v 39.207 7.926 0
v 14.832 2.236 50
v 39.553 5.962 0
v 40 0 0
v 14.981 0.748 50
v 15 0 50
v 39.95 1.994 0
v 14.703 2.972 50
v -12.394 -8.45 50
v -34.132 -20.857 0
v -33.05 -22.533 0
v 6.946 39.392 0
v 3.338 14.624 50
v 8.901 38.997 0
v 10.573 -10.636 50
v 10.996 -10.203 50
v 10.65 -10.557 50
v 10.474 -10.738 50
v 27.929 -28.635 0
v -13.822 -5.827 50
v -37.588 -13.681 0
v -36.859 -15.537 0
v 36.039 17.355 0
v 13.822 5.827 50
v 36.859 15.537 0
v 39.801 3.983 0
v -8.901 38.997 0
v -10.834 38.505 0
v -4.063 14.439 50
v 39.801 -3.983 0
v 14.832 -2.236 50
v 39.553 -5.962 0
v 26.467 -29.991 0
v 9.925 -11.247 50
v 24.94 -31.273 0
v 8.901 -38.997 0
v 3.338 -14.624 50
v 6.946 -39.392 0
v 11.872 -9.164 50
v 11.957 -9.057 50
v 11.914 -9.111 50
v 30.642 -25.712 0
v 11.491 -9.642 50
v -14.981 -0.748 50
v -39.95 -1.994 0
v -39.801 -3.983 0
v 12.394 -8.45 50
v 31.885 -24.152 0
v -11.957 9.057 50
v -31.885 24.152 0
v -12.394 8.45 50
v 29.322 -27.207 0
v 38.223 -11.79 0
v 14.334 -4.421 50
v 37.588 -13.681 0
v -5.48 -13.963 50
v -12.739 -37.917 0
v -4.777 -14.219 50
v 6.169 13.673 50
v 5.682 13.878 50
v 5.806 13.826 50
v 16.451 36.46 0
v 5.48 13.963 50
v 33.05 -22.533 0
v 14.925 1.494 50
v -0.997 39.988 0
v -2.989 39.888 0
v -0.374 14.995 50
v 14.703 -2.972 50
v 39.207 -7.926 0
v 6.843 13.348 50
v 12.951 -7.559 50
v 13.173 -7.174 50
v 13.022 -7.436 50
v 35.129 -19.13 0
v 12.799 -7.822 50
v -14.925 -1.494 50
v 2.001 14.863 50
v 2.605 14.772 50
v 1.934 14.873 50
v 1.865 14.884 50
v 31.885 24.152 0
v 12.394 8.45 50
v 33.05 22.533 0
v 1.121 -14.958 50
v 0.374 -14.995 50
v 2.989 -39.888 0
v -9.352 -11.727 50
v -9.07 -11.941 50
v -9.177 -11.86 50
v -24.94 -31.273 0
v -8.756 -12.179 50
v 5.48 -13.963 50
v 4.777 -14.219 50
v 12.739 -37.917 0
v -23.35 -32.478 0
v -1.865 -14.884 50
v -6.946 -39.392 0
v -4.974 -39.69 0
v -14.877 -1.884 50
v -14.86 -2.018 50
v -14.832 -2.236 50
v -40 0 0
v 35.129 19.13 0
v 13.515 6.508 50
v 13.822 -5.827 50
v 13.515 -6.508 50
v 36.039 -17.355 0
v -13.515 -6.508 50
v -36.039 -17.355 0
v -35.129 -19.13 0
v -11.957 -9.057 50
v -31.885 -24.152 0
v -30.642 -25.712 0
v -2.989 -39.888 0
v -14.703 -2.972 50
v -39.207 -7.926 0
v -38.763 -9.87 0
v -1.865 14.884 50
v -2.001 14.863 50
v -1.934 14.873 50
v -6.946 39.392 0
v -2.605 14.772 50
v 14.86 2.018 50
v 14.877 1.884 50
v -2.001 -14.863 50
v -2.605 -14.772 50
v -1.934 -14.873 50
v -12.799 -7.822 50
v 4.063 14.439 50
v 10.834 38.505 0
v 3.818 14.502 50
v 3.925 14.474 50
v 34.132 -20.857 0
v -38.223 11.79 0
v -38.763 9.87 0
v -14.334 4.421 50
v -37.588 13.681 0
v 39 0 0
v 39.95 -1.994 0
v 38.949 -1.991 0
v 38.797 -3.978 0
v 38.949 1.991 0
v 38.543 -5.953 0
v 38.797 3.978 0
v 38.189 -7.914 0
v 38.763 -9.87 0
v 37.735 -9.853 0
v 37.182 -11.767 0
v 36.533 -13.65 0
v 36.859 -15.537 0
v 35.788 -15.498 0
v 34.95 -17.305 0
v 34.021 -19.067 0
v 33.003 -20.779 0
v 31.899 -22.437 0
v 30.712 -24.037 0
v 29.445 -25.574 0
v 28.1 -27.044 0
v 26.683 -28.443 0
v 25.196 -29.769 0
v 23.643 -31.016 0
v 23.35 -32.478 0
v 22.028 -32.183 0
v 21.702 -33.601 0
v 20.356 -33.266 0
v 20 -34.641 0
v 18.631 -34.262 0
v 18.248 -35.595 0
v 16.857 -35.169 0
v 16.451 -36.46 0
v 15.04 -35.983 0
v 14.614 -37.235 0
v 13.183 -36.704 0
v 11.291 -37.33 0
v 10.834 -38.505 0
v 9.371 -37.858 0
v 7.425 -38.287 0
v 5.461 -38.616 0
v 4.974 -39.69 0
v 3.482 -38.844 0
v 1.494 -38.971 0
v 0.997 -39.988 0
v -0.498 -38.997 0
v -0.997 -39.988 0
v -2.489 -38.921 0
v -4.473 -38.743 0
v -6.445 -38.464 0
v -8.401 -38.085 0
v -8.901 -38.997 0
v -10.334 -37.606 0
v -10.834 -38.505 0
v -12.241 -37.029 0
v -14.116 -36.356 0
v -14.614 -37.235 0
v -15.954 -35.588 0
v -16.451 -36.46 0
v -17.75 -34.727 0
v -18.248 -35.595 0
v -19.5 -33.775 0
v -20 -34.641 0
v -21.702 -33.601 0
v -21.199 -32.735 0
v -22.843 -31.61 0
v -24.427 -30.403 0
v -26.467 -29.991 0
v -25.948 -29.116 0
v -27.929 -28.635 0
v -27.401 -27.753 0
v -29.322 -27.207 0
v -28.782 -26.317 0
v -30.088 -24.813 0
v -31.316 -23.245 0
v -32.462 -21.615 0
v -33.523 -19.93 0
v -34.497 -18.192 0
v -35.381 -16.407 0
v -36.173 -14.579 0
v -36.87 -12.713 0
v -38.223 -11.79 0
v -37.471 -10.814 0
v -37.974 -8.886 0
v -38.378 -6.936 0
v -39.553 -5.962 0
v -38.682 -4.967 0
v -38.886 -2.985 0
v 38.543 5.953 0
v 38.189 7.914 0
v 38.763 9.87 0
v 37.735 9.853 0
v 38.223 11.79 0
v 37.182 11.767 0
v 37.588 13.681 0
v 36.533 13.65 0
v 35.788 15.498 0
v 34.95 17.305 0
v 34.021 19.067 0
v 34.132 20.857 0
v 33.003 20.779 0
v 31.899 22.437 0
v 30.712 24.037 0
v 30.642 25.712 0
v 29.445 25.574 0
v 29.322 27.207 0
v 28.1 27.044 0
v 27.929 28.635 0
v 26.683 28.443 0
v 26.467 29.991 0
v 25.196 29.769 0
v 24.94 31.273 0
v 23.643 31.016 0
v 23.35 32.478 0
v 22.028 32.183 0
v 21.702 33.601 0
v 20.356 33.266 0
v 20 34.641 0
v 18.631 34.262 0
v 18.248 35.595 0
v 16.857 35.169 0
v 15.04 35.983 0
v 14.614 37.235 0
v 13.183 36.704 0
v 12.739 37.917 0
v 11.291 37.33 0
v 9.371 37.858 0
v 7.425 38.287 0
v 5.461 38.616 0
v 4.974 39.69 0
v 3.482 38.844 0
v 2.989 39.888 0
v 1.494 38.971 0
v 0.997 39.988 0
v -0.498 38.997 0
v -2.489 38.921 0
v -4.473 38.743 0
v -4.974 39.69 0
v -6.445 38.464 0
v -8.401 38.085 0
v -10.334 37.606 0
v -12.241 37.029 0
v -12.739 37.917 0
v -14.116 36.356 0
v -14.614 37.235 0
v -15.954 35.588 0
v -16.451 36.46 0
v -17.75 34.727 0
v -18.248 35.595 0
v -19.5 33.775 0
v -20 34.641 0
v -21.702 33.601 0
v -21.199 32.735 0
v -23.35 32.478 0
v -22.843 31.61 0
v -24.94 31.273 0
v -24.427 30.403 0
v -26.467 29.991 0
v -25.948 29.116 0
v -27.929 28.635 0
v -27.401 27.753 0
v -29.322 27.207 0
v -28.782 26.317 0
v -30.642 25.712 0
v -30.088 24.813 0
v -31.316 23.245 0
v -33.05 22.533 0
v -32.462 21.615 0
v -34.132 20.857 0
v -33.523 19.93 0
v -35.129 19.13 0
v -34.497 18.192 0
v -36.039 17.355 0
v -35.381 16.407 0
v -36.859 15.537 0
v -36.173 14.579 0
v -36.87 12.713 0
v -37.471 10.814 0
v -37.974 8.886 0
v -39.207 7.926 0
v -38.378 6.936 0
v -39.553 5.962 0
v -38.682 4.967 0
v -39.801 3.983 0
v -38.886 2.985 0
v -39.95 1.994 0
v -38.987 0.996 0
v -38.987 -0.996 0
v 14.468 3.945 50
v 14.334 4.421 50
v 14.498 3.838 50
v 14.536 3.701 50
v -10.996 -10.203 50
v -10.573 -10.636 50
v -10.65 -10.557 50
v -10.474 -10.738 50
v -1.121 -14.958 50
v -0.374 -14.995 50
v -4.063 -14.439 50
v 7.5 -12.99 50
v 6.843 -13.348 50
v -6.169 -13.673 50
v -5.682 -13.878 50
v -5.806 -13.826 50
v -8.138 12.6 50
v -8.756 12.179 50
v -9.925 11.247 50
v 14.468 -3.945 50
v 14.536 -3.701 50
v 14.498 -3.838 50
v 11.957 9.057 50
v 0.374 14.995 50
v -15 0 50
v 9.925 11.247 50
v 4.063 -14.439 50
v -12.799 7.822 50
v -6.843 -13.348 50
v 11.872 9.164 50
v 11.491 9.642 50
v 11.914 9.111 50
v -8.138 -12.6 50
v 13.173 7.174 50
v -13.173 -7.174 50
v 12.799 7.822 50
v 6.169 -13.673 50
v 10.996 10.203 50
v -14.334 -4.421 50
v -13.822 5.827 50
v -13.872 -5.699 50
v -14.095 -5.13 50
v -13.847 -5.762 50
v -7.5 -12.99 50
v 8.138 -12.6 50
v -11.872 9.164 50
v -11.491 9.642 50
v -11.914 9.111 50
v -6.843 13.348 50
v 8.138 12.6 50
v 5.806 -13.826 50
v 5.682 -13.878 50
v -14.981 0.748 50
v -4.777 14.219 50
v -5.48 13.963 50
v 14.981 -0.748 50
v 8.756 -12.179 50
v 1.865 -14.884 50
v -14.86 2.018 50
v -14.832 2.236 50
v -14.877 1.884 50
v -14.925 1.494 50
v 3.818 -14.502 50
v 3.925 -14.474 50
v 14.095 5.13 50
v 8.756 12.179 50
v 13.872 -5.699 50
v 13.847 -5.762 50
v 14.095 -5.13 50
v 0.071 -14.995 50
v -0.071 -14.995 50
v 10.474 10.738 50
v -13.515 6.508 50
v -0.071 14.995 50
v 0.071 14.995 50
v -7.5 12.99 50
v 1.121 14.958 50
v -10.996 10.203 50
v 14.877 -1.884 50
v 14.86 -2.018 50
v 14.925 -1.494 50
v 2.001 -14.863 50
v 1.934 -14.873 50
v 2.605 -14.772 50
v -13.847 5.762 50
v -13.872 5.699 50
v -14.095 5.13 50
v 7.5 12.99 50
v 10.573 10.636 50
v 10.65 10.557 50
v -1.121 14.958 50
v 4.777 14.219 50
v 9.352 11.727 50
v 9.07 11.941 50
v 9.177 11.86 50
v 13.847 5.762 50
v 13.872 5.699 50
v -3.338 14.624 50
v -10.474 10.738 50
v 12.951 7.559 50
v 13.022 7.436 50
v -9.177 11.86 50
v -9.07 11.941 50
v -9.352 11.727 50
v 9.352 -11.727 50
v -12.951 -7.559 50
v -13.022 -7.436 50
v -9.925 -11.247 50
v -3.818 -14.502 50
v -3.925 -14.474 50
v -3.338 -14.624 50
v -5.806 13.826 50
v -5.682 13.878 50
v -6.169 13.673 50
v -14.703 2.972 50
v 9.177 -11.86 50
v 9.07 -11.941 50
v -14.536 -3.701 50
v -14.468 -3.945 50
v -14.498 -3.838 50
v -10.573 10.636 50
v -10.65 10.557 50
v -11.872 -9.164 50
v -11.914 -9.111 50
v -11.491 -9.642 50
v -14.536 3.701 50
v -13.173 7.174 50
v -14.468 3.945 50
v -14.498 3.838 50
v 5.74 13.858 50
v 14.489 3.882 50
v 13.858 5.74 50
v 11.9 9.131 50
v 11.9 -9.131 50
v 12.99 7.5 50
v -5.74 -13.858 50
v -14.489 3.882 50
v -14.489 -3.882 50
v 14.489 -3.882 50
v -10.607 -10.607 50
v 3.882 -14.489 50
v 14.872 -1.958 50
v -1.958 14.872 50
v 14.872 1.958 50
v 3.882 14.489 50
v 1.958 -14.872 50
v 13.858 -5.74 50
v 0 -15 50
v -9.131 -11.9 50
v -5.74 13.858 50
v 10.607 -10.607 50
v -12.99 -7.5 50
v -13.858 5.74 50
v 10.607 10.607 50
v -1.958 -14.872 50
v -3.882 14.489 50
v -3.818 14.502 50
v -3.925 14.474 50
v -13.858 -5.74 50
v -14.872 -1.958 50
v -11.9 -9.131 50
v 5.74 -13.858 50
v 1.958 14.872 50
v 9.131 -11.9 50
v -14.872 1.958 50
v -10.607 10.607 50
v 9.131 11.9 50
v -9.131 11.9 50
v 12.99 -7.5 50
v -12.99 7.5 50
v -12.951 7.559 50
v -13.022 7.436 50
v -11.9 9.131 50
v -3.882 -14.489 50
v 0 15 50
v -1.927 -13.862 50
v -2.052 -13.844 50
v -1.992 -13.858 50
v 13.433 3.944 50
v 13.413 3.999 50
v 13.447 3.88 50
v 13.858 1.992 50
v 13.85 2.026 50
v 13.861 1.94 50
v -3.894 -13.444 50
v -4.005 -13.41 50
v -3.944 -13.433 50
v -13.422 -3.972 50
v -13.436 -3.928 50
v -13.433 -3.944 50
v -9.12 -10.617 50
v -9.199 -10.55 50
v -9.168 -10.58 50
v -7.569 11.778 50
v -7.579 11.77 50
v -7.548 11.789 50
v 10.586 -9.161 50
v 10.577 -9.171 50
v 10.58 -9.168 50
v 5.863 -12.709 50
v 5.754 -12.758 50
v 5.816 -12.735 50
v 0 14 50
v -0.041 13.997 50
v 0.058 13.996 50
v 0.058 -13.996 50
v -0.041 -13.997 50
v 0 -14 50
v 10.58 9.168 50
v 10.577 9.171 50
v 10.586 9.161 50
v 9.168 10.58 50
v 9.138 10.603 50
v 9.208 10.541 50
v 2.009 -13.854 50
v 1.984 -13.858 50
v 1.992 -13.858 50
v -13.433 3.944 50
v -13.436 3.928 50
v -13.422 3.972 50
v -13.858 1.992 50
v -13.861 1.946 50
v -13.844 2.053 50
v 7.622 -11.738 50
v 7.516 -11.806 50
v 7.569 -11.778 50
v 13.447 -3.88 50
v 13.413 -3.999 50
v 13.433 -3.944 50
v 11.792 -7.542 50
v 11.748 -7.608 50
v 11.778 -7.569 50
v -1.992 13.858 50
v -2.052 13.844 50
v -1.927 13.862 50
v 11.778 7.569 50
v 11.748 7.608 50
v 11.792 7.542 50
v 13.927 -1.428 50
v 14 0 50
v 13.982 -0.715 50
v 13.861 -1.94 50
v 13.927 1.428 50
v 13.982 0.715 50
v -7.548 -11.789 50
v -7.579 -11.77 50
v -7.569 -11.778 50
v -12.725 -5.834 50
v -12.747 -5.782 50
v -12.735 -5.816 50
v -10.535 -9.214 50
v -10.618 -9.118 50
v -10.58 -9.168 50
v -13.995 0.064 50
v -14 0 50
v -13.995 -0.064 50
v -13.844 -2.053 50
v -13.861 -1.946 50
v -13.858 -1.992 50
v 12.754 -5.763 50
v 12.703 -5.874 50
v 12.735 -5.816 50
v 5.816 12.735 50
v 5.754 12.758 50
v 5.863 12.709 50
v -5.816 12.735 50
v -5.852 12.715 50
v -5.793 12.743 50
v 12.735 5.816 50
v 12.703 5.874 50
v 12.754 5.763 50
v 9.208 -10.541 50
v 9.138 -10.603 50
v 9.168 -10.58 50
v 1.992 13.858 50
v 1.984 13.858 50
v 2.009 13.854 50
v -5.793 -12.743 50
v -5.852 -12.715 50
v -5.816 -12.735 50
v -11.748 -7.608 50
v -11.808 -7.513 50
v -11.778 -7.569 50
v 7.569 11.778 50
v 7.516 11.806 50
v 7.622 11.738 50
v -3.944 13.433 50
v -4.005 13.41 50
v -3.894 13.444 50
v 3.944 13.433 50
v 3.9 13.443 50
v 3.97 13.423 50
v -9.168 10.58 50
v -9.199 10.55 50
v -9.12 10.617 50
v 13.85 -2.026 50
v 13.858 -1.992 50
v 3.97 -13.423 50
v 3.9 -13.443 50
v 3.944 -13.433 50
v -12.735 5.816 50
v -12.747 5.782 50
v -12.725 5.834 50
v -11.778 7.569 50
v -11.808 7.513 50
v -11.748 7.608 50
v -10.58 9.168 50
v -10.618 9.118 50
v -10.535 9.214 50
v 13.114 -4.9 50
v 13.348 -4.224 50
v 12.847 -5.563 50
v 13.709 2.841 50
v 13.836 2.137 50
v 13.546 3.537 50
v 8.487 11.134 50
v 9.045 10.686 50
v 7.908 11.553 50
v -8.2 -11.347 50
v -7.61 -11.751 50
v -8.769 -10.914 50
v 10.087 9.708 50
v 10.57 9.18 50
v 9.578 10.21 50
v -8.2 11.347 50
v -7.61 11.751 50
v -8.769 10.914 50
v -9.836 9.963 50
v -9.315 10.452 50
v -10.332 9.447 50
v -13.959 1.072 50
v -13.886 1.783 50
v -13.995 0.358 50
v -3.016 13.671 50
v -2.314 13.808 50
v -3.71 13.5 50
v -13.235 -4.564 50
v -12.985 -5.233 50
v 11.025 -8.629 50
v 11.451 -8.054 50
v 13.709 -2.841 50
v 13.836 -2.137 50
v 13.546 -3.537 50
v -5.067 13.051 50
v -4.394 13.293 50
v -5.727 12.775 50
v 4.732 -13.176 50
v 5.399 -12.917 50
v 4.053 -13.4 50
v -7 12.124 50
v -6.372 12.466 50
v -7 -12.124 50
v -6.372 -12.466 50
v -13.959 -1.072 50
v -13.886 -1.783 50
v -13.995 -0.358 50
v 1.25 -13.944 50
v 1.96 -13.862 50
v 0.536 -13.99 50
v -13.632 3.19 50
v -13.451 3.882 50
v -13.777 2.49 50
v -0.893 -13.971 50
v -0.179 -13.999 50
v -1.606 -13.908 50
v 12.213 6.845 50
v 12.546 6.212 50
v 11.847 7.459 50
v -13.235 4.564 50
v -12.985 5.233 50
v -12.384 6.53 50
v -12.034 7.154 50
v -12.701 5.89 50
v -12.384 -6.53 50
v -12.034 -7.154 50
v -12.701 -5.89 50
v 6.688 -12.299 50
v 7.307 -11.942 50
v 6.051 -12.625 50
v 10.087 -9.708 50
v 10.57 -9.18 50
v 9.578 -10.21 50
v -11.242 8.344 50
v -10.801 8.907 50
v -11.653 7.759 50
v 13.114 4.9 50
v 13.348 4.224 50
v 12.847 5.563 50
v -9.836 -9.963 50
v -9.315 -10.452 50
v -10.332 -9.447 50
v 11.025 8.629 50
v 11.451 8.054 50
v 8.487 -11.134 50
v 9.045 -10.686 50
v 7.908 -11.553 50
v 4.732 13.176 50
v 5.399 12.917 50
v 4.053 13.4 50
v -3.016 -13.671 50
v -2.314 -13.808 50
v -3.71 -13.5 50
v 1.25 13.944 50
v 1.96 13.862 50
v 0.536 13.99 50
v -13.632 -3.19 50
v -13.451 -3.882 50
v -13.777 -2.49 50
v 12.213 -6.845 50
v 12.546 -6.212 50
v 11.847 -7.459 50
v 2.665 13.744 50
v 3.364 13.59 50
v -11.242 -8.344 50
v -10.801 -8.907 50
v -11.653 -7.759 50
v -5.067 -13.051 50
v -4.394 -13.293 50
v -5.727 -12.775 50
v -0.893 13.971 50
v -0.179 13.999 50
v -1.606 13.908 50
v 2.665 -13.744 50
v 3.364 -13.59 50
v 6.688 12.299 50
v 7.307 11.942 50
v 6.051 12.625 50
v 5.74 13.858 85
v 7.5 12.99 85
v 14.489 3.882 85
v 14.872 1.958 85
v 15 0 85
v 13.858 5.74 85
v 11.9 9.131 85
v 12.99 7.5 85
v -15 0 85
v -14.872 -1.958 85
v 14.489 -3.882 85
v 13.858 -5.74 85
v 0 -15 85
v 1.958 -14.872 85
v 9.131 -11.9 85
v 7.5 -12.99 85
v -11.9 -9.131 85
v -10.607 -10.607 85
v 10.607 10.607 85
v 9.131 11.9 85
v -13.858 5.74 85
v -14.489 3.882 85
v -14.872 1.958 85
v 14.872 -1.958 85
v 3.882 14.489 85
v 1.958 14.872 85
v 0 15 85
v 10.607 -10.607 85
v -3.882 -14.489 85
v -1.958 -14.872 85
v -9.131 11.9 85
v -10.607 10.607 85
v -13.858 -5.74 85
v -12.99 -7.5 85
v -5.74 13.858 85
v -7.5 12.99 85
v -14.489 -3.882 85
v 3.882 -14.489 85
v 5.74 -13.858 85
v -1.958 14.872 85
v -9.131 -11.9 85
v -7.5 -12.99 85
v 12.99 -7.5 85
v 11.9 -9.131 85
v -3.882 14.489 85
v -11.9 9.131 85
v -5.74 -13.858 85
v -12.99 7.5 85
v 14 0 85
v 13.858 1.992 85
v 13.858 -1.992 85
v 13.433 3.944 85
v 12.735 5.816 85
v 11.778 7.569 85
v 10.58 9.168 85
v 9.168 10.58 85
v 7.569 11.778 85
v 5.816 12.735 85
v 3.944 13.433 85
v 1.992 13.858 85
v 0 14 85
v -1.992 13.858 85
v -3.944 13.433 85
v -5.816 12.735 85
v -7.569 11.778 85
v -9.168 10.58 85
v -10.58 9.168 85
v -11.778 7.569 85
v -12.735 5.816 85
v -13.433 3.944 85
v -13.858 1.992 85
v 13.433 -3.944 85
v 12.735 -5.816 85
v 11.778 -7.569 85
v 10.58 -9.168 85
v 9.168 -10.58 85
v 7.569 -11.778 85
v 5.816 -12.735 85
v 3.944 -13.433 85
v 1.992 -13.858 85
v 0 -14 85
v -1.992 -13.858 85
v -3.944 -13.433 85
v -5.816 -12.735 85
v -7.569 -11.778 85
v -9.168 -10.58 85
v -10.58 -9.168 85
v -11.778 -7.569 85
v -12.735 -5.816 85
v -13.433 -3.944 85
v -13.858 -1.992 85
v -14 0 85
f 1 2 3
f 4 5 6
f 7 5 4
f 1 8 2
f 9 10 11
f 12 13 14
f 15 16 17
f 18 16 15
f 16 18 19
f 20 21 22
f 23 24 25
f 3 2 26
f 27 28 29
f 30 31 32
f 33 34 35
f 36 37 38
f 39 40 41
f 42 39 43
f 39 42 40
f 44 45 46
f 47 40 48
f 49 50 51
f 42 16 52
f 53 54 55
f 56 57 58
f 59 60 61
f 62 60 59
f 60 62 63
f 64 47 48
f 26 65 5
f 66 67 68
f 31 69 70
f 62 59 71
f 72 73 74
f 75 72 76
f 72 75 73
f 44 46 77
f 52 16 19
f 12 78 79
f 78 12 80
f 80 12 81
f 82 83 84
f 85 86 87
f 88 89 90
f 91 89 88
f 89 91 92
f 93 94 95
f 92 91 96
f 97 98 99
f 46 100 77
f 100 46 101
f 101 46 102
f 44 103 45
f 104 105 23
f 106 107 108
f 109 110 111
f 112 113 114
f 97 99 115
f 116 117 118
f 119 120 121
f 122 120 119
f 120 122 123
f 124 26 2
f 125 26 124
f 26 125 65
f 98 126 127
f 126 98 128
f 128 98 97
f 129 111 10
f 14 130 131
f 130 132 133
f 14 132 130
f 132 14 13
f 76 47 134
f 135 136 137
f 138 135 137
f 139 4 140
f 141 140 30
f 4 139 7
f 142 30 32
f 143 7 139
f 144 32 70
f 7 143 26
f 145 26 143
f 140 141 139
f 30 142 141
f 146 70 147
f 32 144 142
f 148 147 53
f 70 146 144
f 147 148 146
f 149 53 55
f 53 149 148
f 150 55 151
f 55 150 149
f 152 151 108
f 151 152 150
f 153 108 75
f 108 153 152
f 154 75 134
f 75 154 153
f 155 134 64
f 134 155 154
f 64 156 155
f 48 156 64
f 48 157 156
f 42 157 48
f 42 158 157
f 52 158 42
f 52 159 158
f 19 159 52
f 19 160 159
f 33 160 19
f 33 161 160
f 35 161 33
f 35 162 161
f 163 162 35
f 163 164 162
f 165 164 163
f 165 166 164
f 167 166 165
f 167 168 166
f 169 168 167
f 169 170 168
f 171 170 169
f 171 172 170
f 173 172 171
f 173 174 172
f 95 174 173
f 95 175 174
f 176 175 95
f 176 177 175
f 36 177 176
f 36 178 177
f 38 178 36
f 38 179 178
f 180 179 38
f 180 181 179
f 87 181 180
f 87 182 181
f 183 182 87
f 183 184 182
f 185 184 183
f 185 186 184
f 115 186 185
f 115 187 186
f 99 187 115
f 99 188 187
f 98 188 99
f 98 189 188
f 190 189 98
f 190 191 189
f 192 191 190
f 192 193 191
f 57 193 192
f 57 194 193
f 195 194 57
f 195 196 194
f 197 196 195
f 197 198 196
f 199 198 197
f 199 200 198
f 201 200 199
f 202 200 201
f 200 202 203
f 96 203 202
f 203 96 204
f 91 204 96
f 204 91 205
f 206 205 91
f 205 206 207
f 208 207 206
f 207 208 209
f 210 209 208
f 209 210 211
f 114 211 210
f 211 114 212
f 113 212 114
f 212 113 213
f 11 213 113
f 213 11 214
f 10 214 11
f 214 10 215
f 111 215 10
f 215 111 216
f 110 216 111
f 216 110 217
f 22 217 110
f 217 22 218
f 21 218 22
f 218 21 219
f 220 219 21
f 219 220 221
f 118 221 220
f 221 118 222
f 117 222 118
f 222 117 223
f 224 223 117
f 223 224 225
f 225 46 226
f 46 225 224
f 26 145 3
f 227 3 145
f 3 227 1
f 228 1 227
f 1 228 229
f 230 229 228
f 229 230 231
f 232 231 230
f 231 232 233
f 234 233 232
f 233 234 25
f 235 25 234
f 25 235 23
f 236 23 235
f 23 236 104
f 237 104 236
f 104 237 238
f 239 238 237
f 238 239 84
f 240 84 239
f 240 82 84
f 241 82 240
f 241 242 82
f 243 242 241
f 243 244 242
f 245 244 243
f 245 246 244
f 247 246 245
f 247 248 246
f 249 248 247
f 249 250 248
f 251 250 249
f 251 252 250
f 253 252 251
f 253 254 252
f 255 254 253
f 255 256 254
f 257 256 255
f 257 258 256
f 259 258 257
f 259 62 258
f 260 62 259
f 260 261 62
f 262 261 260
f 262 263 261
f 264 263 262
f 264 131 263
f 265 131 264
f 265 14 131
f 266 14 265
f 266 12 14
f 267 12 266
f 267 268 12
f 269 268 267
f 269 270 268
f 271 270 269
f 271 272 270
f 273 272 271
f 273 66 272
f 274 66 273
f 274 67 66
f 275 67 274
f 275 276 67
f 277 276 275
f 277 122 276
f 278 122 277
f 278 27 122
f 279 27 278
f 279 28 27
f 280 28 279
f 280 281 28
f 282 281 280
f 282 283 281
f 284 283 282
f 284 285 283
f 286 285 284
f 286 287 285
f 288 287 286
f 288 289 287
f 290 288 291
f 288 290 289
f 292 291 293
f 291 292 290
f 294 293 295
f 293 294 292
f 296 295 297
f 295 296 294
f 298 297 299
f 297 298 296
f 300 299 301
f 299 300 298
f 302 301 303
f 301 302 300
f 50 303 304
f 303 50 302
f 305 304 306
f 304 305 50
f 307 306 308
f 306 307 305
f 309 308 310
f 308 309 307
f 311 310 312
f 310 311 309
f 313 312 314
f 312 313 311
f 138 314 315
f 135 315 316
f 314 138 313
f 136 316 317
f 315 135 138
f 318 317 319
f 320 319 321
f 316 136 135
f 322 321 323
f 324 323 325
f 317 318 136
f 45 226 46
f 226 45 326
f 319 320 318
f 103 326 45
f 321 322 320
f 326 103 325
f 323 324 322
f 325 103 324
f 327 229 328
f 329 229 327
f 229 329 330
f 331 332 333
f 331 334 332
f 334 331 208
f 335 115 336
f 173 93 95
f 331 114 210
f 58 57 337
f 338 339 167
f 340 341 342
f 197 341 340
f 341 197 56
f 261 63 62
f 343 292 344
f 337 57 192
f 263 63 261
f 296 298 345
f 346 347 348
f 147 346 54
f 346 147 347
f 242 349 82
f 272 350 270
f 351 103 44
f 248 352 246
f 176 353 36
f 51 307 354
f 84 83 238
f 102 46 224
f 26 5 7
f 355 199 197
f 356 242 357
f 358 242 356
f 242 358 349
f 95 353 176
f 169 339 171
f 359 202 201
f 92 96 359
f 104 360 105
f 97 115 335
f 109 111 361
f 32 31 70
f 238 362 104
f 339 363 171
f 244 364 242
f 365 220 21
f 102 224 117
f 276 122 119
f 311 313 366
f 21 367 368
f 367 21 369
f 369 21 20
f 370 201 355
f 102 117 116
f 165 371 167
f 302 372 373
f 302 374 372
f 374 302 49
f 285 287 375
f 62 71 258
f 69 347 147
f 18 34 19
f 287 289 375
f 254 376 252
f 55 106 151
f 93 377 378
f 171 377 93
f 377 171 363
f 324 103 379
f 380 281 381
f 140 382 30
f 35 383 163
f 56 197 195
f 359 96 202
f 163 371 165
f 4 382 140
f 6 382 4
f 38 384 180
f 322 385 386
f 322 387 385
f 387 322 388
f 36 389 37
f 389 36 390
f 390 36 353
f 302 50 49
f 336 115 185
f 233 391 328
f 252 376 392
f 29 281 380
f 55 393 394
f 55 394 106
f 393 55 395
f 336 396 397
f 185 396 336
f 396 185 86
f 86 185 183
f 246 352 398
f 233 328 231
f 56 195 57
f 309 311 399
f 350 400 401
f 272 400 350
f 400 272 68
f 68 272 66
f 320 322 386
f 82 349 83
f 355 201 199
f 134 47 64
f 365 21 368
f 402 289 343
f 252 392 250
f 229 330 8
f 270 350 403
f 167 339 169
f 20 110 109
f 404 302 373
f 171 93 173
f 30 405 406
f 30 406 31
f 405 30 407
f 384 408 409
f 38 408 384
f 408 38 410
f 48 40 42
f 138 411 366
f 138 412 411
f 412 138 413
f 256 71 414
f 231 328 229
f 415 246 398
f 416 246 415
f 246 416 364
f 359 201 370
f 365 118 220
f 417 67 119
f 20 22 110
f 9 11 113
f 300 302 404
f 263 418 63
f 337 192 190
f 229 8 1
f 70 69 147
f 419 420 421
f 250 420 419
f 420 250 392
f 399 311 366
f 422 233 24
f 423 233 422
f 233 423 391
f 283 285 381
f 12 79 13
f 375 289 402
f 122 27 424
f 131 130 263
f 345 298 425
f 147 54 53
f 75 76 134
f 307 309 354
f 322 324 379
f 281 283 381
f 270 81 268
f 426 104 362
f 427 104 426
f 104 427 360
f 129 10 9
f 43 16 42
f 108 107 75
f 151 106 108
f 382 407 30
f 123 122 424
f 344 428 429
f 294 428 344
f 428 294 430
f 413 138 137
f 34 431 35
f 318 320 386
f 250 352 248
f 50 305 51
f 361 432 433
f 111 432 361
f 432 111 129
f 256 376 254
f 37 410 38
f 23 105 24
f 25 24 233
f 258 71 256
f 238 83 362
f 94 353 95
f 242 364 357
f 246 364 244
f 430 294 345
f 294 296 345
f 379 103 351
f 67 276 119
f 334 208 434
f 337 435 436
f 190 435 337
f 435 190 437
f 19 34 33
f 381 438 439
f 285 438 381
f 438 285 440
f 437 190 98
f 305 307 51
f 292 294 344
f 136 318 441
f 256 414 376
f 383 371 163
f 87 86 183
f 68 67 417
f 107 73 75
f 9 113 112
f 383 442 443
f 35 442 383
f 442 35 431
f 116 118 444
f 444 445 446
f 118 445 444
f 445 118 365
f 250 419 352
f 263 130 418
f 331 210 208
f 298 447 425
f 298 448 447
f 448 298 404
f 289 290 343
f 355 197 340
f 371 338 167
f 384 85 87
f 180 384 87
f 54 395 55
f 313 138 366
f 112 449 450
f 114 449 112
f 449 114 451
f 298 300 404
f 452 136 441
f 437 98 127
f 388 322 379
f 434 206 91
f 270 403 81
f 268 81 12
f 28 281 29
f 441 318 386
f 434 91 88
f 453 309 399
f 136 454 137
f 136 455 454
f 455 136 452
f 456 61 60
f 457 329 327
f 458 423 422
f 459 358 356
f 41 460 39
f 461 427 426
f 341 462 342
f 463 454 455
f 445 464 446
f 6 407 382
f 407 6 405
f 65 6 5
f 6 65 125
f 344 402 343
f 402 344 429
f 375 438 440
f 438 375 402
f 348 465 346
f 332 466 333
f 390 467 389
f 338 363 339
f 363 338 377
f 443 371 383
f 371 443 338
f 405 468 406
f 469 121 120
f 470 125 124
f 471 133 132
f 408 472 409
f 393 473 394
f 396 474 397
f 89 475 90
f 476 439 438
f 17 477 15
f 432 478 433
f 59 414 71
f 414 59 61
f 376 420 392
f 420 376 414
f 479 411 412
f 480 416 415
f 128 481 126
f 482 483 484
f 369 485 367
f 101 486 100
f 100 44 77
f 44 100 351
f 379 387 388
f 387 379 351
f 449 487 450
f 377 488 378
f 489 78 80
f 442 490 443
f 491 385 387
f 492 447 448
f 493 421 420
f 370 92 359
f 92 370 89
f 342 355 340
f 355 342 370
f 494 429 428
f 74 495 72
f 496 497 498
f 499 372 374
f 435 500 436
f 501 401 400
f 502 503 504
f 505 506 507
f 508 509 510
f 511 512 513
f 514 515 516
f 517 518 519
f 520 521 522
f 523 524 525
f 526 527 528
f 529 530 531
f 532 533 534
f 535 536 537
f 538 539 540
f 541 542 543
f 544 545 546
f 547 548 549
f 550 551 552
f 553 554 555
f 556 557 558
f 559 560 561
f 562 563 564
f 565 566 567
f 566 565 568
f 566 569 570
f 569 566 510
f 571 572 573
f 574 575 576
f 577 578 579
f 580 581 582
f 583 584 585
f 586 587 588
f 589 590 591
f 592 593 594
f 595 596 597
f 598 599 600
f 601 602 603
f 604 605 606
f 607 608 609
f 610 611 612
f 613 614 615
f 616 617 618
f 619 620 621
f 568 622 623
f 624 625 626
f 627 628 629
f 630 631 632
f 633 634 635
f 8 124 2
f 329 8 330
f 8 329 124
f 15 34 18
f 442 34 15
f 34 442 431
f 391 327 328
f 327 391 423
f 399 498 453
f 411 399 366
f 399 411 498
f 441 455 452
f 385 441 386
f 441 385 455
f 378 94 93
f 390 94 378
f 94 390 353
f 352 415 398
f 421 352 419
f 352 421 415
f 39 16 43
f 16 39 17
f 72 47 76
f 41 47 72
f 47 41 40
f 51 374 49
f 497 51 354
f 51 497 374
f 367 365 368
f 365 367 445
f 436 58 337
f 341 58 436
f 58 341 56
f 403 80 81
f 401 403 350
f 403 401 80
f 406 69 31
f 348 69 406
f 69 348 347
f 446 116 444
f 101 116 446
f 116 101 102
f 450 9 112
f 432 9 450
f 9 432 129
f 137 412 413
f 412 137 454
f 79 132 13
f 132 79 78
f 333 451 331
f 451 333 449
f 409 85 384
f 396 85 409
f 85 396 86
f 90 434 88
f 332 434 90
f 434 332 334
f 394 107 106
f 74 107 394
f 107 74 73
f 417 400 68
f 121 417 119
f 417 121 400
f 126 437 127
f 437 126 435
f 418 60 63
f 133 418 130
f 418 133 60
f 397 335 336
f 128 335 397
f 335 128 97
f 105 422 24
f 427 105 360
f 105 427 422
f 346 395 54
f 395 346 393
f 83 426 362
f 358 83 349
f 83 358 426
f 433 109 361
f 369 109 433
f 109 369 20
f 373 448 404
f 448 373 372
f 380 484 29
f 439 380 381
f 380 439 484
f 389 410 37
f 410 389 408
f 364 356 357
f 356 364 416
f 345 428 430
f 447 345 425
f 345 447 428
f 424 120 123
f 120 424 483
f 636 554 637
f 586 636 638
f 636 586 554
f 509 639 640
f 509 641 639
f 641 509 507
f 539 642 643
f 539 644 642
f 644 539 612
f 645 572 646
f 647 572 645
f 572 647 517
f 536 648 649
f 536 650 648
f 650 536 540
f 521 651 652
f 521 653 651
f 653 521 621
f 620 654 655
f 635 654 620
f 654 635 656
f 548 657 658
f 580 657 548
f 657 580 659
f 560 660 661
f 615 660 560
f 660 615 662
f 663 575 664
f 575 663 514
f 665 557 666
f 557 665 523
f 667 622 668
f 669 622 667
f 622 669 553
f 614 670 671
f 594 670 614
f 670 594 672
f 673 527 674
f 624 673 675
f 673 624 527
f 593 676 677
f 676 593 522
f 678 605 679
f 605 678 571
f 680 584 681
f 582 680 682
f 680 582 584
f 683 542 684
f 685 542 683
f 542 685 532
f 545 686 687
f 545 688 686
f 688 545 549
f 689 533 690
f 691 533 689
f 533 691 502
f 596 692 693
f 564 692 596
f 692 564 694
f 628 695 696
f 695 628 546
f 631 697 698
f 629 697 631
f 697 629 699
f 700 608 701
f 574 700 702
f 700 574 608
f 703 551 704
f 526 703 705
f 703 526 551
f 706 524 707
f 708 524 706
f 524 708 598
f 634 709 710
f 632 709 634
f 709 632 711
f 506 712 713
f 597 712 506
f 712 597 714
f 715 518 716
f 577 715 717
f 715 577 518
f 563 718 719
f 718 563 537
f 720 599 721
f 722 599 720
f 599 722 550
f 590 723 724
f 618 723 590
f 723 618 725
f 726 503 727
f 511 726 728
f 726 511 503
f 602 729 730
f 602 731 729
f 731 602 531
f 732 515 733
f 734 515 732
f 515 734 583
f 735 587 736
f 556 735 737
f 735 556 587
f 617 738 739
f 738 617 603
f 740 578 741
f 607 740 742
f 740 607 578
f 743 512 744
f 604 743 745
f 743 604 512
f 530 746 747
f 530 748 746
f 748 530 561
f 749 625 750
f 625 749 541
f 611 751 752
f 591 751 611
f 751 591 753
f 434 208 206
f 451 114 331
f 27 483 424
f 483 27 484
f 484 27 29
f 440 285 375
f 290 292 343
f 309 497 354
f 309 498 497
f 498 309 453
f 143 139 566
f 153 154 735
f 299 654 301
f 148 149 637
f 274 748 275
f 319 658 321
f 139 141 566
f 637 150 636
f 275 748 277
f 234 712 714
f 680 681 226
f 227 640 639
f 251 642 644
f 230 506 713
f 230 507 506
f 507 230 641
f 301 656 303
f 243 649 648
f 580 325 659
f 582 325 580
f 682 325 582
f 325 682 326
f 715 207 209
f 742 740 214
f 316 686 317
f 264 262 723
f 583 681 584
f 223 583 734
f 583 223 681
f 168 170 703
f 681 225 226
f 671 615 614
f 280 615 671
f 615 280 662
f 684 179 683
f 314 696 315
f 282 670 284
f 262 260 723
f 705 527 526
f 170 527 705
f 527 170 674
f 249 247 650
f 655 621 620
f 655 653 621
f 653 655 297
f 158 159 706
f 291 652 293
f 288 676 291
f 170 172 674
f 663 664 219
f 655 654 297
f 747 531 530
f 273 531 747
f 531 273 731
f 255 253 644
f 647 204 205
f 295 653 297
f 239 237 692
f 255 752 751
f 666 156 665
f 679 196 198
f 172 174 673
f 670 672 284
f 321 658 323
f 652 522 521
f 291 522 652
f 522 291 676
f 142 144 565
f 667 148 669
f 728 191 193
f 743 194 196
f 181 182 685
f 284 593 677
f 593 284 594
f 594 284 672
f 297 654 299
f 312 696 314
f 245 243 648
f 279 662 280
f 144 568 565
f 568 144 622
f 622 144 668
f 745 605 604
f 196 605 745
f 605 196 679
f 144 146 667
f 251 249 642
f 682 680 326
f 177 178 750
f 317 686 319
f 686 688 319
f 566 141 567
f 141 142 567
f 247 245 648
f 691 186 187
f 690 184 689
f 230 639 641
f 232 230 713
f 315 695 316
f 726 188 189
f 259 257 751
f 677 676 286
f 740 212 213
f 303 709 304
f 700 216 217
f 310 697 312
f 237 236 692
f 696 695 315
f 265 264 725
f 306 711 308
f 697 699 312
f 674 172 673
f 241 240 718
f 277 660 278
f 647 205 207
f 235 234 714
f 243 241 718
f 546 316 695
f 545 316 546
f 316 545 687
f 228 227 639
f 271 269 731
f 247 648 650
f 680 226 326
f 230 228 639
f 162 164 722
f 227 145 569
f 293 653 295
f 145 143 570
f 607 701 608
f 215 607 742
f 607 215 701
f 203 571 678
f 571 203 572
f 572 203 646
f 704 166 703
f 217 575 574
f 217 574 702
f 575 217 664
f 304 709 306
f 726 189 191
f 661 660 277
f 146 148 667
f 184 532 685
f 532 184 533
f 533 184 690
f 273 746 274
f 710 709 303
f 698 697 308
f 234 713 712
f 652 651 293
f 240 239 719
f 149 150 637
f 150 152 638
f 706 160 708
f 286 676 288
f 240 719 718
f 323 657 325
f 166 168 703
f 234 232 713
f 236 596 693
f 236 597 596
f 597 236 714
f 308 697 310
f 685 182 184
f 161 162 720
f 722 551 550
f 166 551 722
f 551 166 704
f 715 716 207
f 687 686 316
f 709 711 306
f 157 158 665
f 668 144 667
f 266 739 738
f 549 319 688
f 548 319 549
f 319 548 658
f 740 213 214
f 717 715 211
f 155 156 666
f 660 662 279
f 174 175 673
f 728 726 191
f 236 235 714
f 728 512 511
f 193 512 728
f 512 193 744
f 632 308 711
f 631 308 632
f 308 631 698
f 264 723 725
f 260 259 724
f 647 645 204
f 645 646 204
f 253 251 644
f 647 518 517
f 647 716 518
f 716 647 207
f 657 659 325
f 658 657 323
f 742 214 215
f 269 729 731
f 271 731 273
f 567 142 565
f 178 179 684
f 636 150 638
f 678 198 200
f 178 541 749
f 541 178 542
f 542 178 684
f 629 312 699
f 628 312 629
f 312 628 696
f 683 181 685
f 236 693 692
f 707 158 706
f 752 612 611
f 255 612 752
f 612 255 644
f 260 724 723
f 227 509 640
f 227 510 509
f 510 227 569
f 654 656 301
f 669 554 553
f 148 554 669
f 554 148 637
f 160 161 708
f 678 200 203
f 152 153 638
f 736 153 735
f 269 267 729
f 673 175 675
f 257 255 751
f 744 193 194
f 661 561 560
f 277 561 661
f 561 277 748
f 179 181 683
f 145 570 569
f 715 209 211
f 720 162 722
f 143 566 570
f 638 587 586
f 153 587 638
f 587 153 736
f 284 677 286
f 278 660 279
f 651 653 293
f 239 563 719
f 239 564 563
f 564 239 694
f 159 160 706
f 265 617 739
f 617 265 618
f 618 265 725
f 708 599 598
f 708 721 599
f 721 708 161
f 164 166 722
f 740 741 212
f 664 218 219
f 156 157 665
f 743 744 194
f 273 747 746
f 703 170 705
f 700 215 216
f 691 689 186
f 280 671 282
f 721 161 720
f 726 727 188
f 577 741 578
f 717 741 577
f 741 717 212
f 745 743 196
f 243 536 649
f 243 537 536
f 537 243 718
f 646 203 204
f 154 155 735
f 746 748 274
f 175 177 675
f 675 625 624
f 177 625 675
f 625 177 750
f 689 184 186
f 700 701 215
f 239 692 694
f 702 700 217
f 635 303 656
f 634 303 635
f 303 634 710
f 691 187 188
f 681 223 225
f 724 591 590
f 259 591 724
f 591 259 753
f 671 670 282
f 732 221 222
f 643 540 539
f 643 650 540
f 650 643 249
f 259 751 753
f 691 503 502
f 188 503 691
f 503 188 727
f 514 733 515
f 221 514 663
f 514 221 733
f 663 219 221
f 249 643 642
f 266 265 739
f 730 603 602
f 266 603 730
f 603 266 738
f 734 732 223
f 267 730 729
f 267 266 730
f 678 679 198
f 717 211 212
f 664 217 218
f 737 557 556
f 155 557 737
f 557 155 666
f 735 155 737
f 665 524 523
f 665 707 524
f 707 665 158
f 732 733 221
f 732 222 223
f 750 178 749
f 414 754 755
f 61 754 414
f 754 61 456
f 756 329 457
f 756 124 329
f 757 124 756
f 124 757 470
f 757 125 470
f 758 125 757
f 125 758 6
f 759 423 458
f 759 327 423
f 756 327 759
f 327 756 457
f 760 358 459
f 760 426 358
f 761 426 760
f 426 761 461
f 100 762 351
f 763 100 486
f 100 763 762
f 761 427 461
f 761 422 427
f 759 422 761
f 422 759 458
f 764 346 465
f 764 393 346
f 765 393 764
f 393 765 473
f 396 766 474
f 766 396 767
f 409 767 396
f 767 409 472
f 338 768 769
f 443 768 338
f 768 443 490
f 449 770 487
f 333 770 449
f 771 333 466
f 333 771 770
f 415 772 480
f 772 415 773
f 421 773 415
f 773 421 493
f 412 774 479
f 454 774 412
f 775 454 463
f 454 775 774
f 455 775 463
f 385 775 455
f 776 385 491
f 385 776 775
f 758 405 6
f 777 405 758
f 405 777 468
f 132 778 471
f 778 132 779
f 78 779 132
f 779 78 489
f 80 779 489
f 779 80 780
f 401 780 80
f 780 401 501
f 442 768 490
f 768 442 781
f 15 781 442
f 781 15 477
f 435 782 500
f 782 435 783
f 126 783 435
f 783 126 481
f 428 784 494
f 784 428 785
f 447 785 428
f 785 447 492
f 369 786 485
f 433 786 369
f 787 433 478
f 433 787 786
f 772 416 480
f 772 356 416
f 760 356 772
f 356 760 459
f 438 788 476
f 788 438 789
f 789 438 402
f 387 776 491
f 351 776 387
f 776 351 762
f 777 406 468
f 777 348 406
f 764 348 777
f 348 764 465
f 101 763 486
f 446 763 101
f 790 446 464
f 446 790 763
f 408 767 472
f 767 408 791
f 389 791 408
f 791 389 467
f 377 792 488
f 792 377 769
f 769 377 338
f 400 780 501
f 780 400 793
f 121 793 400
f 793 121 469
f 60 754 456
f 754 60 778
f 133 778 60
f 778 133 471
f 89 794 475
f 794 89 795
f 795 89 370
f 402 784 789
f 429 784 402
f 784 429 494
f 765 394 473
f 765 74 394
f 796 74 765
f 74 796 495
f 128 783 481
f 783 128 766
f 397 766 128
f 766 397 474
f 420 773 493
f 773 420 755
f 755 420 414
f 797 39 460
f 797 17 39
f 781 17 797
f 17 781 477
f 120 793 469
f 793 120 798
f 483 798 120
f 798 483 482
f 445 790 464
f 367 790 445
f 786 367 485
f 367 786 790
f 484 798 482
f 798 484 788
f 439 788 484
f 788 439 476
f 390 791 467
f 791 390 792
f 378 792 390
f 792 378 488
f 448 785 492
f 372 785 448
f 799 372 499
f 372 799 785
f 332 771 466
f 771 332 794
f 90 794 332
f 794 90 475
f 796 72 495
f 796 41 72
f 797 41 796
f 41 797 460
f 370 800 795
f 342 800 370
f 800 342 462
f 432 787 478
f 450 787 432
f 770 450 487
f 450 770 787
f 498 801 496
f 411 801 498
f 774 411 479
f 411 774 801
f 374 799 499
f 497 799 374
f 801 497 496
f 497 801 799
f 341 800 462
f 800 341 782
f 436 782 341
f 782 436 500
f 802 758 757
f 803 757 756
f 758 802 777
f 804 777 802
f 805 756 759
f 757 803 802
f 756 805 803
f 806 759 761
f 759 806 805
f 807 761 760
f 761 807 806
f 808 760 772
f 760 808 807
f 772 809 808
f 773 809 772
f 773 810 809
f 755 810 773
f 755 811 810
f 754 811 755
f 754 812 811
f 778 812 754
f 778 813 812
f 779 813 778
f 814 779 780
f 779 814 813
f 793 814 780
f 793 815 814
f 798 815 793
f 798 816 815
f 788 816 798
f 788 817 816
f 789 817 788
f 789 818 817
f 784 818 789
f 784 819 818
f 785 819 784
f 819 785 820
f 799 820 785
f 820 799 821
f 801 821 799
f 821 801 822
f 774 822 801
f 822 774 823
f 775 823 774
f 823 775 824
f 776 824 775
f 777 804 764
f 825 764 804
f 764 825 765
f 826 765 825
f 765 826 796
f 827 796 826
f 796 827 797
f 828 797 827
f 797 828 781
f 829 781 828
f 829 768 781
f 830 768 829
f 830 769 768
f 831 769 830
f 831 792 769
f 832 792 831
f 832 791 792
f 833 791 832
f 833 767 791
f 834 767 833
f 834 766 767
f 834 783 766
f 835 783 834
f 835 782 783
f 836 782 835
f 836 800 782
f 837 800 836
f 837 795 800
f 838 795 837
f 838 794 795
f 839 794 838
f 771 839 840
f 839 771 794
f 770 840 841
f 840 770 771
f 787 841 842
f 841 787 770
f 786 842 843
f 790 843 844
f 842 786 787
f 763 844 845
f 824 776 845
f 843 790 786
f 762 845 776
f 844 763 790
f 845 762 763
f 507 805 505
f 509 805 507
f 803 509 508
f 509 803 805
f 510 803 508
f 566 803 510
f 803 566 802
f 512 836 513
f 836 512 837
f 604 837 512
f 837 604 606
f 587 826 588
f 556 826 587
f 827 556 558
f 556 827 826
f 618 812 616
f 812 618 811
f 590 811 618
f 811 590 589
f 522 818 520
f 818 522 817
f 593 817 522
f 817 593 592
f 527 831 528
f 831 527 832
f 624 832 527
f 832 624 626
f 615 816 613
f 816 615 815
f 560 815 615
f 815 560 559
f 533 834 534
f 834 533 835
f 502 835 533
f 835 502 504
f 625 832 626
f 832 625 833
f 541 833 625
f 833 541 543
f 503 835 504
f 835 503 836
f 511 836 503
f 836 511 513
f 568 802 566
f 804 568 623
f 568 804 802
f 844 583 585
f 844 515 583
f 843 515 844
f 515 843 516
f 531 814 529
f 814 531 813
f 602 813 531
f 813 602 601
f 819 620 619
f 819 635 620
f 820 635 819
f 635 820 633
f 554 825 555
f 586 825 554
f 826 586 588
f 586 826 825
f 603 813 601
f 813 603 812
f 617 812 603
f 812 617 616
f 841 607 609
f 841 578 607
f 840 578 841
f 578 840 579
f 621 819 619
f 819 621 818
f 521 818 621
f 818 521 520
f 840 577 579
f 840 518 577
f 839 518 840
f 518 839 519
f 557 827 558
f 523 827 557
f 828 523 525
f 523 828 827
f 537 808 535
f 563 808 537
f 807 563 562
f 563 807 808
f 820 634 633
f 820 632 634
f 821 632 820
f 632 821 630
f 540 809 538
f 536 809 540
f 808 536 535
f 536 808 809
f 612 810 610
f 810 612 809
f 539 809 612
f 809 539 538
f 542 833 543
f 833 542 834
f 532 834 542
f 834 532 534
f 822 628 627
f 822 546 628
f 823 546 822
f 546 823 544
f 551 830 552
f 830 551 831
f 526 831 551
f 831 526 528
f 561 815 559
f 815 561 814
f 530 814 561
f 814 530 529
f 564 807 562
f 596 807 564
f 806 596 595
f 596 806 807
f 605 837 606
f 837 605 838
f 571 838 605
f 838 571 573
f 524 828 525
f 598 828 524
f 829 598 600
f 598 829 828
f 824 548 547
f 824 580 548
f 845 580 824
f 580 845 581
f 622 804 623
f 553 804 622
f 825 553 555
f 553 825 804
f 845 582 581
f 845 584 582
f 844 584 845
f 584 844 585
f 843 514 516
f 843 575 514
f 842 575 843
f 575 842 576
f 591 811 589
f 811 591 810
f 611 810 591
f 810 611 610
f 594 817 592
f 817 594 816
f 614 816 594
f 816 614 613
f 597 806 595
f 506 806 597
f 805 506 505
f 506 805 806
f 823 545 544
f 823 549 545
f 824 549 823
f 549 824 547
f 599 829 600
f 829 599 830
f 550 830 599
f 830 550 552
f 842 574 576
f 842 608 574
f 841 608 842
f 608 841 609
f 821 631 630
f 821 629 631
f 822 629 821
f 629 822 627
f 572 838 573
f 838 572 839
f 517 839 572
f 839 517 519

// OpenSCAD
// Generic funnel
$fa = 1.0;

// outside diameter
diameter_top = 80;
diameter_mid = 30;
diameter_bot = 30;

height_top = 50;
height_bot = 35;

thickness = 1;

// Note: model is upside down for easier printing

// top half
difference() {
    cylinder(height_top, diameter_top / 2, diameter_mid / 2);
    cylinder(height_top, diameter_top / 2 - thickness, diameter_mid / 2 - thickness);
}

// bottom half
translate([0, 0, height_top])
difference() {
    cylinder(height_bot, diameter_mid / 2, diameter_bot / 2);
    cylinder(height_bot, diameter_mid / 2 - thickness, diameter_bot / 2 - thickness);
}
